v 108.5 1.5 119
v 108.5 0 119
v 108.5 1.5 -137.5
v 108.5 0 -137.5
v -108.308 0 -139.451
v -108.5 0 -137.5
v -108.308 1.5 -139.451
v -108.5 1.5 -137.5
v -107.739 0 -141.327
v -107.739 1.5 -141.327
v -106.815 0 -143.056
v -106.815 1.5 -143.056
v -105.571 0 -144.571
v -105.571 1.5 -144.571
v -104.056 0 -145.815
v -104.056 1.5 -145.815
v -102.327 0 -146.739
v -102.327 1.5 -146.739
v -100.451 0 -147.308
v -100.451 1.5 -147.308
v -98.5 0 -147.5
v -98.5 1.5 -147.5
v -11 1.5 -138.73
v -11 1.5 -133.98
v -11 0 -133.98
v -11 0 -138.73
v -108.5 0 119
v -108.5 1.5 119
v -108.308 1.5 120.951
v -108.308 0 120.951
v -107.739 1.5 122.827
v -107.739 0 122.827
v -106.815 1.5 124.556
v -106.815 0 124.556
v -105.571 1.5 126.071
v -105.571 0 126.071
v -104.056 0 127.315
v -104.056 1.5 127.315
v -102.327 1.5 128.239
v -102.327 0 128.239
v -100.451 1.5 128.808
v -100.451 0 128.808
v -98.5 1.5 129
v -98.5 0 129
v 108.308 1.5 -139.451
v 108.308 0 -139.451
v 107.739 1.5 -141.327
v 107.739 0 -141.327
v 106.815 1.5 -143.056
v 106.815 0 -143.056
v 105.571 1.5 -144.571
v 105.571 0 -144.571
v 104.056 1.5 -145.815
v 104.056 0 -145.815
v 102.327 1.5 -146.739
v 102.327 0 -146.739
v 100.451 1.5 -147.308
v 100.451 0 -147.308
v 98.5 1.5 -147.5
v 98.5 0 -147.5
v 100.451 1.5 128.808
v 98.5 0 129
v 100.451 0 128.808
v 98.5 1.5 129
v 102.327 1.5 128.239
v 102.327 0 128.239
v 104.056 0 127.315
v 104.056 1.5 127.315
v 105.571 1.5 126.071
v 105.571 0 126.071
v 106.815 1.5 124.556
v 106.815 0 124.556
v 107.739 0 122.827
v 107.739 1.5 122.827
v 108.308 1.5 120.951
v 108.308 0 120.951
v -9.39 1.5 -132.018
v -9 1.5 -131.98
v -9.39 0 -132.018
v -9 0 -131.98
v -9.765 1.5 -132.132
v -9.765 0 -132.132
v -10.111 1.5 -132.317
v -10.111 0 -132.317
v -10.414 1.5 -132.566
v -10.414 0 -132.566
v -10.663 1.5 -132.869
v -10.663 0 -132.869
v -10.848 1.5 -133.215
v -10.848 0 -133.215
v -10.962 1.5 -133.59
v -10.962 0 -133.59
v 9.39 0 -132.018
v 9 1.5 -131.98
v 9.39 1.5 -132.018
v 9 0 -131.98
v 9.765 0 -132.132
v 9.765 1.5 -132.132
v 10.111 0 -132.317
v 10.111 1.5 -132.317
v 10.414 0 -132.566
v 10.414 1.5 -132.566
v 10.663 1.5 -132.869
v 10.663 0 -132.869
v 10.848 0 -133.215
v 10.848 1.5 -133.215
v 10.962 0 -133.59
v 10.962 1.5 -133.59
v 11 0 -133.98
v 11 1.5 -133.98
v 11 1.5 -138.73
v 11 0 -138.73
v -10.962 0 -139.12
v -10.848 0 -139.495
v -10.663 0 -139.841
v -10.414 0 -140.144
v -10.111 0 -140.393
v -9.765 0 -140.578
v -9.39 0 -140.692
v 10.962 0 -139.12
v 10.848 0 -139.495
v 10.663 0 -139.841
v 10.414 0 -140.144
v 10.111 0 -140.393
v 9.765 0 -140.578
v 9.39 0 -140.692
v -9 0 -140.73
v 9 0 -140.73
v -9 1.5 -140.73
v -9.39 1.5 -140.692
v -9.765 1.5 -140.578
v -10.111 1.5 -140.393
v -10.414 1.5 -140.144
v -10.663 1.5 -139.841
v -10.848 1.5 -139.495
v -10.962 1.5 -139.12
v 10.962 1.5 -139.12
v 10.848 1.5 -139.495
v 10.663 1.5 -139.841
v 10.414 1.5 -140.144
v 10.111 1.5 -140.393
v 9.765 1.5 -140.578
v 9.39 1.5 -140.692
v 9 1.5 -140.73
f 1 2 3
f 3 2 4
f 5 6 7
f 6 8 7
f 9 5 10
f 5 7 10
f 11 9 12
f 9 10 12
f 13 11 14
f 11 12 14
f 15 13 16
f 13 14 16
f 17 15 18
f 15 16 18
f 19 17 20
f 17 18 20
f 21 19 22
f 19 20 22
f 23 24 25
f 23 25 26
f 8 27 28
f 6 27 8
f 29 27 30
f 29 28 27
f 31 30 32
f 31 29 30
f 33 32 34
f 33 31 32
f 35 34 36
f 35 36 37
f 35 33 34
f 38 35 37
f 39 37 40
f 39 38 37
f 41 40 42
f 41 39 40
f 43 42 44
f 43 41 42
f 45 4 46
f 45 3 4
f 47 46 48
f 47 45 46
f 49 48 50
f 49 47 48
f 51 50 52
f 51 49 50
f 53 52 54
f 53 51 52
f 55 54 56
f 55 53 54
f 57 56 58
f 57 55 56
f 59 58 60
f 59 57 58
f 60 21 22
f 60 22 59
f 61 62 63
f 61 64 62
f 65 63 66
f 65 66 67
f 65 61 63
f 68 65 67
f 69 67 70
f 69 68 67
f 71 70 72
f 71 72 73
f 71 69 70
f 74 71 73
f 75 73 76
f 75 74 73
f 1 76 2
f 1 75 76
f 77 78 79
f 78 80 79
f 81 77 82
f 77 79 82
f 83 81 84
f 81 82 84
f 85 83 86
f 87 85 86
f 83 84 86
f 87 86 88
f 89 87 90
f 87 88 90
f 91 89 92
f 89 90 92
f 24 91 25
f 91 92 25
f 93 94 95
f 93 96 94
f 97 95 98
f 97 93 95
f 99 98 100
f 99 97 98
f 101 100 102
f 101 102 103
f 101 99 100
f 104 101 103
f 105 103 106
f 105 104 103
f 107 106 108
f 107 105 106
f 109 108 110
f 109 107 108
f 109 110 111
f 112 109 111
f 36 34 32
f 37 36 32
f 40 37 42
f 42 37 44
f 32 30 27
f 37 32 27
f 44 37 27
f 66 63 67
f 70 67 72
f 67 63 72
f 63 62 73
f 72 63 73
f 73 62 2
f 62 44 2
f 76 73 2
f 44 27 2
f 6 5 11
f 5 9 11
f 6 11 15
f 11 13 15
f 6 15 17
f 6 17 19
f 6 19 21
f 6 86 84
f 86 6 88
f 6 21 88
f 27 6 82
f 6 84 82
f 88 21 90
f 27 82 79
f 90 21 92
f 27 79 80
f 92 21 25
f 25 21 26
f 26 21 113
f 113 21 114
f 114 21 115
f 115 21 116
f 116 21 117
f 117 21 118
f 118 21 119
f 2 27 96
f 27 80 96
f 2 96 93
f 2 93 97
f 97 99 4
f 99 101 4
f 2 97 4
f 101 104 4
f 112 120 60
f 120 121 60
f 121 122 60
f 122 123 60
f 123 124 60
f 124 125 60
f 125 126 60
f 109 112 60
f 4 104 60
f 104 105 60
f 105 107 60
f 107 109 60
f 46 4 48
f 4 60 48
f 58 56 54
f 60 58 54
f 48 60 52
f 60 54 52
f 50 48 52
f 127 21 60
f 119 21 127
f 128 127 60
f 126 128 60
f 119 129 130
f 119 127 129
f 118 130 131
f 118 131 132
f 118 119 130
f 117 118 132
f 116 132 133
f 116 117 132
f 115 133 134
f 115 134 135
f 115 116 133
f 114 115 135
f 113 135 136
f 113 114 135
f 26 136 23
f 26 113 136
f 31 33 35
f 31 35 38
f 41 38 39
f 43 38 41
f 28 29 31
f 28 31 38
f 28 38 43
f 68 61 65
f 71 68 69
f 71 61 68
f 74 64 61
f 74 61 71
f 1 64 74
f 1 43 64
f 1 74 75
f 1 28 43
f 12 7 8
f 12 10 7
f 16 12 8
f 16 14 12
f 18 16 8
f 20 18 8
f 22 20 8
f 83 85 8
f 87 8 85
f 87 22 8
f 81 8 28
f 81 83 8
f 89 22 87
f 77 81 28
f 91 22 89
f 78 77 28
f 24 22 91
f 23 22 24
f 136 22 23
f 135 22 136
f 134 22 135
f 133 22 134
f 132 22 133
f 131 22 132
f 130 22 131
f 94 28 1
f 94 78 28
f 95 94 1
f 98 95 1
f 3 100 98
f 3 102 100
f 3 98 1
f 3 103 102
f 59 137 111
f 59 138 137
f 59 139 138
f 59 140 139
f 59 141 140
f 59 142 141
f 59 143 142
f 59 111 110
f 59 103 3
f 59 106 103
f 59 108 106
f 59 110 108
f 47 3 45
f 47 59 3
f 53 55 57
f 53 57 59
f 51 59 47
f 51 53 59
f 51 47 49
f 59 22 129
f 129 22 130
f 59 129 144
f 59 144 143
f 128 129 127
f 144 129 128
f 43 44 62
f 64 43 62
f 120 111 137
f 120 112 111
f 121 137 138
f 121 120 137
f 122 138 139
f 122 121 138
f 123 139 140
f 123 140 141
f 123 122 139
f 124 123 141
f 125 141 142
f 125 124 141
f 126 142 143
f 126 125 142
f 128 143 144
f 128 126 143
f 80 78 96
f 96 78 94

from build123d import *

# Parameters (mm, degrees)
SKETCH1_W           = 217
SKETCH1_H           = 276.5
BOSS_EXTRUDE1_DEPTH = 1.5
FILLET1_R           = 10
SKETCH4_W           = 22
SKETCH4_H           = 8.75
CUT_EXTRUDE2_DEPTH  = 184.114035508
FILLET2_R           = 2


with BuildPart() as part:
    # Sketch1 → Boss-Extrude1 (new body)
    with BuildSketch(Plane(origin=(0, 0, 0), x_dir=(1, 0, 0), z_dir=(0, 1, 0))):
        with Locations((0, 9.25)):
            Rectangle(SKETCH1_W, SKETCH1_H)
    extrude(amount=BOSS_EXTRUDE1_DEPTH)

    # Fillet1
    fillet1_edges = [part.edges().sort_by_distance(p)[0] for p in [
        (-108.5, 0.75, -147.5),
        (108.5, 0.75, -147.5),
        (108.5, 0.75, 129),
        (-108.5, 0.75, 129),
    ]]
    fillet(fillet1_edges, radius=FILLET1_R)

    # Sketch4 → Cut-Extrude2 (cut, through all)
    with BuildSketch(Plane(origin=(0, 1.5, 0), x_dir=(1, 0, 0), z_dir=(0, 1, 0))):
        with Locations((0, 136.355)):
            Rectangle(SKETCH4_W, SKETCH4_H)
    extrude(amount=-CUT_EXTRUDE2_DEPTH, mode=Mode.SUBTRACT)

    # Fillet2
    fillet2_edges = [part.edges().sort_by_distance(p)[0] for p in [
        (-11, 0.75, -131.98),
        (-11, 0.75, -140.73),
        (11, 0.75, -140.73),
        (11, 0.75, -131.98),
    ]]
    fillet(fillet2_edges, radius=FILLET2_R)


solid = part.part
